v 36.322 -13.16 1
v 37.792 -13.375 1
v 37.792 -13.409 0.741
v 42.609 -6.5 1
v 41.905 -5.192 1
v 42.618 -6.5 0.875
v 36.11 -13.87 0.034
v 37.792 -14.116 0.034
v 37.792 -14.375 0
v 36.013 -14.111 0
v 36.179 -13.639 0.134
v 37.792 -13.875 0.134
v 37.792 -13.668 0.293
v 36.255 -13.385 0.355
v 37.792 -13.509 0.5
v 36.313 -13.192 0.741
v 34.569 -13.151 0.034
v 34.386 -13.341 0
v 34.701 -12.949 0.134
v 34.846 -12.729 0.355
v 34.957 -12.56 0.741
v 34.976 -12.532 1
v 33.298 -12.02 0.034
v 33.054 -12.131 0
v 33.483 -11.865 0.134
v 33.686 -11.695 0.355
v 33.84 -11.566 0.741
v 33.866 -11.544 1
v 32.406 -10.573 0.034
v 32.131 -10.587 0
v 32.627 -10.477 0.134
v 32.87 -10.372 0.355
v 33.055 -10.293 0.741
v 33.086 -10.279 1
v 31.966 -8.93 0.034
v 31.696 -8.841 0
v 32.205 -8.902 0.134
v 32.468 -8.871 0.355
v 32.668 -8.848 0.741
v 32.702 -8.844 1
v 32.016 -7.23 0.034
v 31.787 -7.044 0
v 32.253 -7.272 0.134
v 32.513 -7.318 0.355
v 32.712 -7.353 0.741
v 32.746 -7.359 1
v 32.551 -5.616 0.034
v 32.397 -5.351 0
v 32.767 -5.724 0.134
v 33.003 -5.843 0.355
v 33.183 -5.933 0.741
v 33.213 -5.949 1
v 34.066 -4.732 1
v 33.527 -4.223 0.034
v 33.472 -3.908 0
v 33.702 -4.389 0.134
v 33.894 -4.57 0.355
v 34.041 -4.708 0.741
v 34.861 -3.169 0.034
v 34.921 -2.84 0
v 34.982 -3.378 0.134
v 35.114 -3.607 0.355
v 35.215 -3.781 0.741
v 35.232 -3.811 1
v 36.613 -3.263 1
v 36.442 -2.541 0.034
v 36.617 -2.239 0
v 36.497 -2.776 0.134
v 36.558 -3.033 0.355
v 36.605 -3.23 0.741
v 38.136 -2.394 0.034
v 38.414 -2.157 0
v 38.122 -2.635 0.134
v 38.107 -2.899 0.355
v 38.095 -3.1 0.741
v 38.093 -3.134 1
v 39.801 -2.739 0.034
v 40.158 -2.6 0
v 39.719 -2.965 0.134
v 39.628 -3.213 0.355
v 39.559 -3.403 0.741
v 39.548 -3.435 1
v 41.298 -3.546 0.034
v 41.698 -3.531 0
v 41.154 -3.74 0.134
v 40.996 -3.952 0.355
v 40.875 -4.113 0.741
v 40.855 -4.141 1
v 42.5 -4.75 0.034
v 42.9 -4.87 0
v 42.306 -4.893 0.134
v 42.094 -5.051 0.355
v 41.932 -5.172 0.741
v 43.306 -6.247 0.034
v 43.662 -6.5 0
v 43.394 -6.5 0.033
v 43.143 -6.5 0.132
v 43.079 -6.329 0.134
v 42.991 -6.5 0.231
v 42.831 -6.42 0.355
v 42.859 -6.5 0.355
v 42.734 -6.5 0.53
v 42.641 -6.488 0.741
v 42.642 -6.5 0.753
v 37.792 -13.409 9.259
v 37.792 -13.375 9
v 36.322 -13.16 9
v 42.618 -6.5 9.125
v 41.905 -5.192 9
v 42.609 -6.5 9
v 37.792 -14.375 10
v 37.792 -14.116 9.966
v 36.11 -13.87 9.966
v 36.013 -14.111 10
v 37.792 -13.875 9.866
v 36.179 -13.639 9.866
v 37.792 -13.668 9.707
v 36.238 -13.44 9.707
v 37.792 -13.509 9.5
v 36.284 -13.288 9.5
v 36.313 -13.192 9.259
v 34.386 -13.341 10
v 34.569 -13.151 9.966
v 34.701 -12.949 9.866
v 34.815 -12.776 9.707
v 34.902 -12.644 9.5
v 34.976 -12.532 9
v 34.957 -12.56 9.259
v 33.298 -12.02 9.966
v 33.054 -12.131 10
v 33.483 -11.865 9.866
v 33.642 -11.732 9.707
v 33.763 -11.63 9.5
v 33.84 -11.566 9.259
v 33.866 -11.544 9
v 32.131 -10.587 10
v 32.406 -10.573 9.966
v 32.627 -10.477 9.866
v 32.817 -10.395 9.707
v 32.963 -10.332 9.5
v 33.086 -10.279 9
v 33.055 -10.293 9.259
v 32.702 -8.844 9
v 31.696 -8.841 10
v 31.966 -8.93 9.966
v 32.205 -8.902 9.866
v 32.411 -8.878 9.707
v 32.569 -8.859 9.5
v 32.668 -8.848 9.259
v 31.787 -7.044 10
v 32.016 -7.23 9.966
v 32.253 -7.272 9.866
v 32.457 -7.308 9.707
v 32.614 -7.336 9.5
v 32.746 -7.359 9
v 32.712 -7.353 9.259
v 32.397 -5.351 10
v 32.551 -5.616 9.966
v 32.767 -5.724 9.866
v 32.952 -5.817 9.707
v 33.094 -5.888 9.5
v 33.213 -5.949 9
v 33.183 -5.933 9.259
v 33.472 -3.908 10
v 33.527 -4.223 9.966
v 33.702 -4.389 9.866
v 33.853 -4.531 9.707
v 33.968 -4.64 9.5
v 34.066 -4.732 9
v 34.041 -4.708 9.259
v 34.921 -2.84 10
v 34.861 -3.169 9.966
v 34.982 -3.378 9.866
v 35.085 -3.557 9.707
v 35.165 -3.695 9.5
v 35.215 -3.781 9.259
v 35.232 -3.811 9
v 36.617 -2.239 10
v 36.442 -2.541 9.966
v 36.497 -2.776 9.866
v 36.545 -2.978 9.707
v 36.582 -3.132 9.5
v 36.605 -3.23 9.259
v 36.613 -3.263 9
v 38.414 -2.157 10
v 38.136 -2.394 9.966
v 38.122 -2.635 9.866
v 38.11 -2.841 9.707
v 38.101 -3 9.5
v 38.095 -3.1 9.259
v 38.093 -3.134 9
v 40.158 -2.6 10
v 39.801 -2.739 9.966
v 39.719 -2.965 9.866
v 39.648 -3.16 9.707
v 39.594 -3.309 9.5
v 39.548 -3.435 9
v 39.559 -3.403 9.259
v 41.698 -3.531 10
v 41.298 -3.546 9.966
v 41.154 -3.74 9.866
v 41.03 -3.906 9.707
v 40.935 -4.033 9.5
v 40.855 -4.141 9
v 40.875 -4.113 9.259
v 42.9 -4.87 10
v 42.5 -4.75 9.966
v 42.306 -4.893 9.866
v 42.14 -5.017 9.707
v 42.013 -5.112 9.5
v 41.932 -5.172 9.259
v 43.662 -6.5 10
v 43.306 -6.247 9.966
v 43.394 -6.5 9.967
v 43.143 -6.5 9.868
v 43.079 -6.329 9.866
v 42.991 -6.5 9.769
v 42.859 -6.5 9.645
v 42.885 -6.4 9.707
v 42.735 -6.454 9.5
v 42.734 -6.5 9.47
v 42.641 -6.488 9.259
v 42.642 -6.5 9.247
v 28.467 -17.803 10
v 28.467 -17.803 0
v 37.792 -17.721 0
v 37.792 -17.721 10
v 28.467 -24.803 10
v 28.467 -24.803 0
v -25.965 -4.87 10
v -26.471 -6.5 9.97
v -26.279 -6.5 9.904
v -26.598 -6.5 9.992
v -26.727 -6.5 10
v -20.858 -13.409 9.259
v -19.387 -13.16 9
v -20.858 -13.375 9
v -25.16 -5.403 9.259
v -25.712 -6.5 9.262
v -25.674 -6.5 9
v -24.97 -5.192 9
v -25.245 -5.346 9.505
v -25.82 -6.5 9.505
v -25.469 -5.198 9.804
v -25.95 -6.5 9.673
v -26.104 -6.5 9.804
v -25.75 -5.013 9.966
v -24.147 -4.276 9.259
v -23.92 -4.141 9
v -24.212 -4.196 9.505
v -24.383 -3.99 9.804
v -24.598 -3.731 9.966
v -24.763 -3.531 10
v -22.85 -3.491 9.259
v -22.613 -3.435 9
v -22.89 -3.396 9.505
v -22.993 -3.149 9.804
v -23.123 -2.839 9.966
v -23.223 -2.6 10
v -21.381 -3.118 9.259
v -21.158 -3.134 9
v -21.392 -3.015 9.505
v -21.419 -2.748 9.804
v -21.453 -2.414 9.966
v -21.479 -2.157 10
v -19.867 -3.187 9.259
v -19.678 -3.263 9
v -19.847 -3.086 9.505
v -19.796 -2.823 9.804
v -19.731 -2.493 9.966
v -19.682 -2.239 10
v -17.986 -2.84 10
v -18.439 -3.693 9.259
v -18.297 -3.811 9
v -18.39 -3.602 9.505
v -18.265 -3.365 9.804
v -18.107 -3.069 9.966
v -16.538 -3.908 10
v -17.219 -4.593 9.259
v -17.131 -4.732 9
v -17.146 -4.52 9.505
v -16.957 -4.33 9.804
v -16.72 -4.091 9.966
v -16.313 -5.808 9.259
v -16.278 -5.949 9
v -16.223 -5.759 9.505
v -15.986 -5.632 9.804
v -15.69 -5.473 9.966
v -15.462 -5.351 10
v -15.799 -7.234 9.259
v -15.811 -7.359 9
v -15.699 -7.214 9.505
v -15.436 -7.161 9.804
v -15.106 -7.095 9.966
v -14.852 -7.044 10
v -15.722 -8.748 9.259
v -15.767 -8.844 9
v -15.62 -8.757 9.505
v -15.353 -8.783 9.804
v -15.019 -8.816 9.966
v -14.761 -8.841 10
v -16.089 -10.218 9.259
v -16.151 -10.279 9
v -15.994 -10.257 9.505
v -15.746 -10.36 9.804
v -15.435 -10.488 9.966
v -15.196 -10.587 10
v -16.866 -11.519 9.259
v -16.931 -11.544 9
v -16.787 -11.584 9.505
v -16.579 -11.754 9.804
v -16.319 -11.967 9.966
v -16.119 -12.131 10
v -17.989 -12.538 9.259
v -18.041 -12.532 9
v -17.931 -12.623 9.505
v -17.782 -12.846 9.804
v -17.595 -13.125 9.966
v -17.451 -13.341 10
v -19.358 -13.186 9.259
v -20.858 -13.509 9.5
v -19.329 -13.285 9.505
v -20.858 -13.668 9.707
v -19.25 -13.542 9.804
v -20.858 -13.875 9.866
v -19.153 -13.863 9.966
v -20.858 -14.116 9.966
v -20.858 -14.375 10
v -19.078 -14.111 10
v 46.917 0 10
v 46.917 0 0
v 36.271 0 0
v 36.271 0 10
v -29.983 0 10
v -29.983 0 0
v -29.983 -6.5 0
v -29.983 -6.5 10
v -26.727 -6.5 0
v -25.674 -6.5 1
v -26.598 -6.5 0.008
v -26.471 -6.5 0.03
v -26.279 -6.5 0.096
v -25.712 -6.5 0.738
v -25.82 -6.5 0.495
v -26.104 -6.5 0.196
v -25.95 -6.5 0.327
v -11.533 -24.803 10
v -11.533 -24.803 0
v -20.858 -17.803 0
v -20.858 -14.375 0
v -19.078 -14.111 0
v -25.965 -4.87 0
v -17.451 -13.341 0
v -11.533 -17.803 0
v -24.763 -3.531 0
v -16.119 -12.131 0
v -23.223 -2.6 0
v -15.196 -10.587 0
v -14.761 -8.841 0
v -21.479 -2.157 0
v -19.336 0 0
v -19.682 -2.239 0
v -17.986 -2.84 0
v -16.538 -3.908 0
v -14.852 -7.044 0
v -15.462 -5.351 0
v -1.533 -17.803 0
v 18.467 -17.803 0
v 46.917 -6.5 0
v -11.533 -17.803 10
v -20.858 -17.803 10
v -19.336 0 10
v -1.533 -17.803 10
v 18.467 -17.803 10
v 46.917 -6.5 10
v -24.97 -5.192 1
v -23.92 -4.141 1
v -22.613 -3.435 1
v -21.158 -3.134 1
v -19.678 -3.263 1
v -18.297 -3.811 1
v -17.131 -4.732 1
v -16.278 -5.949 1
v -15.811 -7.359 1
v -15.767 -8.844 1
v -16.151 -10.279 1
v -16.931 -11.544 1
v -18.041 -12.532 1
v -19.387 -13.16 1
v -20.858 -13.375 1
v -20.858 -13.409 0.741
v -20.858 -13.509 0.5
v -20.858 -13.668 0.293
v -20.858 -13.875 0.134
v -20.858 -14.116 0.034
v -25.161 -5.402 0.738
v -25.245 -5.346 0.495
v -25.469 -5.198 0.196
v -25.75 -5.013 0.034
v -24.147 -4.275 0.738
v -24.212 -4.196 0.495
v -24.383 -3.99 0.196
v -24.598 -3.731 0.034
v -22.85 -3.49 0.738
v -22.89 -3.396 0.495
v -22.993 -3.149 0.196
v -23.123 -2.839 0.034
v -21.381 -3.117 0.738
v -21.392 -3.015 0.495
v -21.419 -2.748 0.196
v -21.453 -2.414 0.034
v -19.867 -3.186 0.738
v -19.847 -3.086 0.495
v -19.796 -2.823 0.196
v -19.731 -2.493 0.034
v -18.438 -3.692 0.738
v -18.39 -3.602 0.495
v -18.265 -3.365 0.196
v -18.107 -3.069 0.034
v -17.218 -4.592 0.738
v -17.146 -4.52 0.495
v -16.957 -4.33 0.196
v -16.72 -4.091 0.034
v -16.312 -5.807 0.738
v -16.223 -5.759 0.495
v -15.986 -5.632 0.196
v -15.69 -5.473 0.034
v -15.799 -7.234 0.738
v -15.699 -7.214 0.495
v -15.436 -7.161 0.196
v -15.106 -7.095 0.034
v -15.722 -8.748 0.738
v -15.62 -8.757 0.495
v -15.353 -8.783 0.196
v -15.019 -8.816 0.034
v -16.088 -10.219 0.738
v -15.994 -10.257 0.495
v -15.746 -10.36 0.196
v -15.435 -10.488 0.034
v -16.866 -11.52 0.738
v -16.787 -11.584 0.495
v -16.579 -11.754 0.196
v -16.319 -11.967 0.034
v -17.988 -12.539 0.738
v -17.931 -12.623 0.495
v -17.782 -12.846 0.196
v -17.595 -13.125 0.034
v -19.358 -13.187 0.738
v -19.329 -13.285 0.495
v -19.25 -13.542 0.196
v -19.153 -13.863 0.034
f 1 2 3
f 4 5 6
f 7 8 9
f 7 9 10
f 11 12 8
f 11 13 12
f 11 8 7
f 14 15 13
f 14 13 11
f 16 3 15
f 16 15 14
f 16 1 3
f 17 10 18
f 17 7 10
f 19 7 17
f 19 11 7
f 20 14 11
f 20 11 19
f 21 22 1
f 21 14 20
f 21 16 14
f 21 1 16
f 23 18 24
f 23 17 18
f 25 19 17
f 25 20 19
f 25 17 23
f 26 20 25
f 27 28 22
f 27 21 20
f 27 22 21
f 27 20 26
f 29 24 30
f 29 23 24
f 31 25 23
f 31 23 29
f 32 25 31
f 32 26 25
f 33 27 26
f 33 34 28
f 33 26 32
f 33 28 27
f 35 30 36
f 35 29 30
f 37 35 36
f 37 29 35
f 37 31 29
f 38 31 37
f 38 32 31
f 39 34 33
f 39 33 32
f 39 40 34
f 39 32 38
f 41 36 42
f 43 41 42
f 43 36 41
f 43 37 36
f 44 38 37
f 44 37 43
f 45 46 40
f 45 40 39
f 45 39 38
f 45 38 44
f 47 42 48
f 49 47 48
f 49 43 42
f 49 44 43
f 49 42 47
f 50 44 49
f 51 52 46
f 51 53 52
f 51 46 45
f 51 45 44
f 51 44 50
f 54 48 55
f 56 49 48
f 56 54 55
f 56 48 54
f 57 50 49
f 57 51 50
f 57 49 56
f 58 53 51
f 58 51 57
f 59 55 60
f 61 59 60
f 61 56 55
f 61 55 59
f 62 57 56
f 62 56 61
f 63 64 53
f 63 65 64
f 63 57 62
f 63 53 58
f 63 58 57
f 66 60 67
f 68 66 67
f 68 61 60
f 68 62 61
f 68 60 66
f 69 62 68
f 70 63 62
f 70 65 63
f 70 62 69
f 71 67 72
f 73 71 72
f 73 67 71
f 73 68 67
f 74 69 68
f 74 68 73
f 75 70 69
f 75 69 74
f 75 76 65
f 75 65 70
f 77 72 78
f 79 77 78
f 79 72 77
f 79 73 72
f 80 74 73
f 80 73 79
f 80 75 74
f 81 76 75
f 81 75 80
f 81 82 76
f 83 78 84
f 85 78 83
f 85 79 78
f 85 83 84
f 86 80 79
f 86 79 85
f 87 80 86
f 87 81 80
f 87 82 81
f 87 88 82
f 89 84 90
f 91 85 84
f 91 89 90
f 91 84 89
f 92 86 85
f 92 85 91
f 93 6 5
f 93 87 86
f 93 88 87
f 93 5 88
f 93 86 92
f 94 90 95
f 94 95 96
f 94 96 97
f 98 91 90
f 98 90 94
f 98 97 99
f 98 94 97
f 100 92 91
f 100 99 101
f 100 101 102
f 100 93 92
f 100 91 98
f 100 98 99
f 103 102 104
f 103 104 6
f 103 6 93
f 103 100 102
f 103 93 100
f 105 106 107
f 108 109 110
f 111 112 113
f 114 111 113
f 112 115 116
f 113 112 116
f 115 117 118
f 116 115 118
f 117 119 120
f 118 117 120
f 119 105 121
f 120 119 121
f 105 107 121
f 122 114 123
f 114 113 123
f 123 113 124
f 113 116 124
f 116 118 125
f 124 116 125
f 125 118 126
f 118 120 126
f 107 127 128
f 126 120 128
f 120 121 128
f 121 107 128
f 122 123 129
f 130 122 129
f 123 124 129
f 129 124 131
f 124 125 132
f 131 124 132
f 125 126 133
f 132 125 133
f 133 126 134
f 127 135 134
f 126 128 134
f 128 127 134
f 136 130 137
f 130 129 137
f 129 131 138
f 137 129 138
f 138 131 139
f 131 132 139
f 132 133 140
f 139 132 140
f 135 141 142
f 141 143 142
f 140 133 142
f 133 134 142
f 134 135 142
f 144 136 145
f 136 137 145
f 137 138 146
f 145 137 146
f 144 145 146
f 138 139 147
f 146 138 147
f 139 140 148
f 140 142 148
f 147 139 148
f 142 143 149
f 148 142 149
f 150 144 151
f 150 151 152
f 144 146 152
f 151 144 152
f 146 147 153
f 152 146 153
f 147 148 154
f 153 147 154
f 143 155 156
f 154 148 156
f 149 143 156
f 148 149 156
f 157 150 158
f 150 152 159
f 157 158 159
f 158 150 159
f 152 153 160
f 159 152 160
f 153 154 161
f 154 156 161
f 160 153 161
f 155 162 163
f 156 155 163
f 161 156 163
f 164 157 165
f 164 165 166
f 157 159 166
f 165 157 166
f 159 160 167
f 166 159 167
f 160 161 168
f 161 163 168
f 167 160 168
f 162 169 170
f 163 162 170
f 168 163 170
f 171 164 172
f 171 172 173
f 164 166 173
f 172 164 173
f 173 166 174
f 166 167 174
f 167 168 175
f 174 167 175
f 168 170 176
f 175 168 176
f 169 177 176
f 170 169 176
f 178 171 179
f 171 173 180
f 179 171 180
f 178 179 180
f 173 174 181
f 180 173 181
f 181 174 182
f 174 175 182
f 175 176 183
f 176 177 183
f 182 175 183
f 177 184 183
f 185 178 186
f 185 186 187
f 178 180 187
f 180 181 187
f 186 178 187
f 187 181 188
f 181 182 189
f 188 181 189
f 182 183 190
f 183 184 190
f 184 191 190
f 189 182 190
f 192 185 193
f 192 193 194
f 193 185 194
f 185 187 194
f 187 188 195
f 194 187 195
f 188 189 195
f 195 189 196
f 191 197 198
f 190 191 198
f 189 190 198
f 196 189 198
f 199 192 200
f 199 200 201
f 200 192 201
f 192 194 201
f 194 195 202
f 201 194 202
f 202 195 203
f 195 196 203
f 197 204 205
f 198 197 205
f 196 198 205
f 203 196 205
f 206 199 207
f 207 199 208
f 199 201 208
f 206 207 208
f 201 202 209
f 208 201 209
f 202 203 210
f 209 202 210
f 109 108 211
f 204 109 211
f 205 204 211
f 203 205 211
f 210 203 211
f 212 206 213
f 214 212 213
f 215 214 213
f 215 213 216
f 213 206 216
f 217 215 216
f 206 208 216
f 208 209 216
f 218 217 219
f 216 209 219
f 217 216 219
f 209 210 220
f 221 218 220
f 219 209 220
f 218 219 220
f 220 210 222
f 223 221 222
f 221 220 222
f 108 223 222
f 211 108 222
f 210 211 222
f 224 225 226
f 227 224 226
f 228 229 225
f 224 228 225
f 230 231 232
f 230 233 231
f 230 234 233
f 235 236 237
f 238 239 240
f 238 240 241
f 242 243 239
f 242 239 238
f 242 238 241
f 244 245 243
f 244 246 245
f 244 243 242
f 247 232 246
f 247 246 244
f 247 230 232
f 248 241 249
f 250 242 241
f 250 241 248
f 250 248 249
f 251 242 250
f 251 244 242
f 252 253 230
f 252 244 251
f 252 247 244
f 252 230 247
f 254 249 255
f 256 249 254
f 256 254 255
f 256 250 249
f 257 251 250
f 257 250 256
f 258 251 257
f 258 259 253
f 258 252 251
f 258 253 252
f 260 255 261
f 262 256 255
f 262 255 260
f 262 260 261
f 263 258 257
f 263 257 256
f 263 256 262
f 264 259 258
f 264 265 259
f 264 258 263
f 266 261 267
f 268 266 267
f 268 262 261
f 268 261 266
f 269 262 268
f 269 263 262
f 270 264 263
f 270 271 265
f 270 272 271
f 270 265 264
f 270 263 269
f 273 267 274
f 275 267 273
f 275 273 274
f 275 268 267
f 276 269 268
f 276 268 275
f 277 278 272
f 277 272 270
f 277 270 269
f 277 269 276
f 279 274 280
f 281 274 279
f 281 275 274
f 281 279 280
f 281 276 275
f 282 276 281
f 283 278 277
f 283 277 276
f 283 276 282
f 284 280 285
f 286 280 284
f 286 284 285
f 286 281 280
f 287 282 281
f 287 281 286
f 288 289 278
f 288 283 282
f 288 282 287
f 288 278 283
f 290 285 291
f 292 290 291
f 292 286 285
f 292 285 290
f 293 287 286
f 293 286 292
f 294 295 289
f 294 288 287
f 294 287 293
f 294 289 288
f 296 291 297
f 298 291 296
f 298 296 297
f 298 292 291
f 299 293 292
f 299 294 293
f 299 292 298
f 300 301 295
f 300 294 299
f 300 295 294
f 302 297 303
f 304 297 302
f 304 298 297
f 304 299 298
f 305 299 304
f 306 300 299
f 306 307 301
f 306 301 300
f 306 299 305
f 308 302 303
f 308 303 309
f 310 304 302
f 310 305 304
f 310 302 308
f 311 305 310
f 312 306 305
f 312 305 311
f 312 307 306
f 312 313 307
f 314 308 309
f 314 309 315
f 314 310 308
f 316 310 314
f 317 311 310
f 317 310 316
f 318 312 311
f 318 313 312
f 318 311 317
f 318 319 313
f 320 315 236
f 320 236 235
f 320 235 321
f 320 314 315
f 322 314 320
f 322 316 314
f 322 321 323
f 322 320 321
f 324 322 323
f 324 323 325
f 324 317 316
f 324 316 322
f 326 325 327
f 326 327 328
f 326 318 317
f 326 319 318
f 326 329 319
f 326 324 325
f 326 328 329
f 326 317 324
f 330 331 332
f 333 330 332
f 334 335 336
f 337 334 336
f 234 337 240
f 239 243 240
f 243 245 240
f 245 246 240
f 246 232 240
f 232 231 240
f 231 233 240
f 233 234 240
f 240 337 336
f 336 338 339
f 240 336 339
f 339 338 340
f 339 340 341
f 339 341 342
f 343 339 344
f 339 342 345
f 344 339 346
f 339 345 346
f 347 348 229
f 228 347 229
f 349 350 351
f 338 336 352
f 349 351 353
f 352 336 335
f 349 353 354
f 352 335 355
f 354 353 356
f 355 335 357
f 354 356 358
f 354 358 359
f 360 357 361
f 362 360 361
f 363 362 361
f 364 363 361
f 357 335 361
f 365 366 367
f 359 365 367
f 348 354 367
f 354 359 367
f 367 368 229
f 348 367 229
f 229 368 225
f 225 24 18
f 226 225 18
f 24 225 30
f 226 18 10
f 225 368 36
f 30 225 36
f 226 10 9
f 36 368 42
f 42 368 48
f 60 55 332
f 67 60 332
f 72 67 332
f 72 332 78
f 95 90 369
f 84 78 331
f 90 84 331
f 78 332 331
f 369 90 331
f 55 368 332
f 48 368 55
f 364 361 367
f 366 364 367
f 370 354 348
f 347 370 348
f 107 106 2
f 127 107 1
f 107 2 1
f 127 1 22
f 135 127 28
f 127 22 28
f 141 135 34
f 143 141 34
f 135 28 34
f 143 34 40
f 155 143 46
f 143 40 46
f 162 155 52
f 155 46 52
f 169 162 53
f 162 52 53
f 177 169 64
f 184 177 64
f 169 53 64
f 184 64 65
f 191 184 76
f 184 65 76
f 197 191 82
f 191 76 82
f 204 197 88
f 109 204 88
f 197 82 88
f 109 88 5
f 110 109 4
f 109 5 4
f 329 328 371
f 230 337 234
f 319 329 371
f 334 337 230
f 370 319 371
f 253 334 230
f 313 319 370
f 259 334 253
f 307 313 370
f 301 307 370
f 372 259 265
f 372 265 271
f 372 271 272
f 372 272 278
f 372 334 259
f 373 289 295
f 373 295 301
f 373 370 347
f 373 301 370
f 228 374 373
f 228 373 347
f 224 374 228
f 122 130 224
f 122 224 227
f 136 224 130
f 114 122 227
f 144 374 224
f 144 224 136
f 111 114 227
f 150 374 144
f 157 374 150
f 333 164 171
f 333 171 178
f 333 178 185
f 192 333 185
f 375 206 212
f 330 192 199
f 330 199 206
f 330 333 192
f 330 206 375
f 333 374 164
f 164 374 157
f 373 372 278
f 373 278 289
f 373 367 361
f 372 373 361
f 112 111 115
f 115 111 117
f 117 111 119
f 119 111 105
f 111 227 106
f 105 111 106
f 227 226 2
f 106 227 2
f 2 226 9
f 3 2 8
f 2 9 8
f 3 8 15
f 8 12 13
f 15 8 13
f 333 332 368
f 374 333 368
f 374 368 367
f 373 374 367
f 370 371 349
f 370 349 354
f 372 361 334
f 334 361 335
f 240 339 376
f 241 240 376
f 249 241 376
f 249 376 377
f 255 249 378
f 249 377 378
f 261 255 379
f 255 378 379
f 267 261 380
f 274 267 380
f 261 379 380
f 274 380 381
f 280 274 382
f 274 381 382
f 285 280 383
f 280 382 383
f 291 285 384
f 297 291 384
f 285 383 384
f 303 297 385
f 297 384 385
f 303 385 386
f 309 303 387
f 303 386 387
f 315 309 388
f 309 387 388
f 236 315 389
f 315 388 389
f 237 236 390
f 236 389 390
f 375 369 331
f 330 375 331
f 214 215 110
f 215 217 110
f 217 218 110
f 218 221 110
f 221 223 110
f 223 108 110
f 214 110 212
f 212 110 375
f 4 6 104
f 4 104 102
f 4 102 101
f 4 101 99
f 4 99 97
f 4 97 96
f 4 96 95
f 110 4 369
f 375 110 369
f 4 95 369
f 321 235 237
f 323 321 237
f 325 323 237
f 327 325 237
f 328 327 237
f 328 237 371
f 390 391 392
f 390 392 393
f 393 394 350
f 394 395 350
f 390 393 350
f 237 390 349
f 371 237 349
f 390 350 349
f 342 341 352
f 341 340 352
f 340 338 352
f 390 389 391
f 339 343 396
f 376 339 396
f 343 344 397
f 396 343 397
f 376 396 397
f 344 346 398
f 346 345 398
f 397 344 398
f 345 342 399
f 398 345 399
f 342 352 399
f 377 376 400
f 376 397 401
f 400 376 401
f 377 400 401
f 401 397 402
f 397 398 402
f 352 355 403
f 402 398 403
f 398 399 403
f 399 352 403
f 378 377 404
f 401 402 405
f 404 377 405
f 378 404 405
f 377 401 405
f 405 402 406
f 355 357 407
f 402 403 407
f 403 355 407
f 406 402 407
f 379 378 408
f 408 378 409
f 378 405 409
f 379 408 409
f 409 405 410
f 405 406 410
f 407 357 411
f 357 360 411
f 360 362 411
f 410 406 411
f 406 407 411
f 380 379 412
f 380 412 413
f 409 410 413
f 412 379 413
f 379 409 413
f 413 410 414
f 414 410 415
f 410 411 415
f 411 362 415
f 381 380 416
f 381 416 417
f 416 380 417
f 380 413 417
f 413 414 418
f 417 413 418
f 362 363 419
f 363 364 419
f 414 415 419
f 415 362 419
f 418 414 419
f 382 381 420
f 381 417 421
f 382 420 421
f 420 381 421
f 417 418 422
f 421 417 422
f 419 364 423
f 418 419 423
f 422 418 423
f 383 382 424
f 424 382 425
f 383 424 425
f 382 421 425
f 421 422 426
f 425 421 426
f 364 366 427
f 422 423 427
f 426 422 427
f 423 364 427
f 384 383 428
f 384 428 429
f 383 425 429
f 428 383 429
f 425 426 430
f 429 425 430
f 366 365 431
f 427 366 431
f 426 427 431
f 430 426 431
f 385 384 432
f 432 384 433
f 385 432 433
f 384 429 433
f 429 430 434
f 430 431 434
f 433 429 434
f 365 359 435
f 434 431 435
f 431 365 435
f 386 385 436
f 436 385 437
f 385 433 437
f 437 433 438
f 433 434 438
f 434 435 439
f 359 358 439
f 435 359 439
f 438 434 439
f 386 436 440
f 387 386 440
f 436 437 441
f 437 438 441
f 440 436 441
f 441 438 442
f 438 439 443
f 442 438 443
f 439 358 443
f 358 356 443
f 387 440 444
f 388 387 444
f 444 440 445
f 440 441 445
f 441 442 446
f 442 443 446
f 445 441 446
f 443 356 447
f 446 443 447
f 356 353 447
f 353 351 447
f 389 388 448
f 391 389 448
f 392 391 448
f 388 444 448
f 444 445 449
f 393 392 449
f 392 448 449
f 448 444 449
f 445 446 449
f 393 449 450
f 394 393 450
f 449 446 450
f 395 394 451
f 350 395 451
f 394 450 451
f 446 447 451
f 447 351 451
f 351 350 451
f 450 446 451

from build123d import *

# Parameters (mm, degrees)
F1_DEPTH = 10
F2_R     = 1
F3_R     = 1


with BuildPart() as f1:
    # F0 (on Top) → F1 (new body)
    with BuildSketch(Plane.XY):
        with BuildLine():
            Line((-20.85751, -17.803463), (-11.53251, -17.803463))
            Line((-11.53251, -17.803463), (-1.53251, -17.803463))
            Line((-1.53251, -17.803463), (-19.335973, 0))
            Line((-19.335973, 0), (-25.98251, 0))
            Line((-25.98251, 0), (-29.98251, 0))
            Line((-29.98251, 0), (-29.98251, -6.5))
            Line((-29.98251, -6.5), (-25.674472, -6.5))
            ThreePointArc((-25.674472, -6.5), (-16.660227, -5.309177), (-20.85751, -13.375))
            Line((-20.85751, -13.375), (-20.85751, -16.5))
            Line((-20.85751, -16.5), (-20.85751, -17.803463))
        make_face()
        Polygon((-1.53251, -17.803463), (-11.53251, -17.803463), (-11.53251, -24.803463), (8.46749, -24.803463), (8.46749, -17.803463), align=None)
        Polygon((18.46749, -17.803463), (8.46749, -17.803463), (8.46749, -24.803463), (28.46749, -24.803463), (28.46749, -17.803463), align=None)
        with BuildLine():
            Line((36.270953, 0), (18.46749, -17.803463))
            Line((18.46749, -17.803463), (28.46749, -17.803463))
            Line((28.46749, -17.803463), (37.79249, -17.720502))
            Line((37.79249, -17.720502), (37.79249, -13.375))
            ThreePointArc((37.79249, -13.375), (33.595207, -5.309177), (42.609452, -6.5))
            Line((42.609452, -6.5), (46.91749, -6.5))
            Line((46.91749, -6.5), (46.91749, 0))
            Line((46.91749, 0), (42.91749, 0))
            Line((42.91749, 0), (36.270953, 0))
        make_face()
    extrude(amount=F1_DEPTH)

    # F2
    f2_edges = [f1.edges().sort_by_distance(p)[0] for p in [
        (-16.660227, -5.309177, 10),
    ]]
    fillet(f2_edges, radius=F2_R)

    # F3
    f3_edges = [f1.edges().sort_by_distance(p)[0] for p in [
        (33.595207, -5.309177, 10),
        (-16.660227, -5.309177, 0),
        (33.595207, -5.309177, 0),
    ]]
    fillet(f3_edges, radius=F3_R)


solid = f1.part
